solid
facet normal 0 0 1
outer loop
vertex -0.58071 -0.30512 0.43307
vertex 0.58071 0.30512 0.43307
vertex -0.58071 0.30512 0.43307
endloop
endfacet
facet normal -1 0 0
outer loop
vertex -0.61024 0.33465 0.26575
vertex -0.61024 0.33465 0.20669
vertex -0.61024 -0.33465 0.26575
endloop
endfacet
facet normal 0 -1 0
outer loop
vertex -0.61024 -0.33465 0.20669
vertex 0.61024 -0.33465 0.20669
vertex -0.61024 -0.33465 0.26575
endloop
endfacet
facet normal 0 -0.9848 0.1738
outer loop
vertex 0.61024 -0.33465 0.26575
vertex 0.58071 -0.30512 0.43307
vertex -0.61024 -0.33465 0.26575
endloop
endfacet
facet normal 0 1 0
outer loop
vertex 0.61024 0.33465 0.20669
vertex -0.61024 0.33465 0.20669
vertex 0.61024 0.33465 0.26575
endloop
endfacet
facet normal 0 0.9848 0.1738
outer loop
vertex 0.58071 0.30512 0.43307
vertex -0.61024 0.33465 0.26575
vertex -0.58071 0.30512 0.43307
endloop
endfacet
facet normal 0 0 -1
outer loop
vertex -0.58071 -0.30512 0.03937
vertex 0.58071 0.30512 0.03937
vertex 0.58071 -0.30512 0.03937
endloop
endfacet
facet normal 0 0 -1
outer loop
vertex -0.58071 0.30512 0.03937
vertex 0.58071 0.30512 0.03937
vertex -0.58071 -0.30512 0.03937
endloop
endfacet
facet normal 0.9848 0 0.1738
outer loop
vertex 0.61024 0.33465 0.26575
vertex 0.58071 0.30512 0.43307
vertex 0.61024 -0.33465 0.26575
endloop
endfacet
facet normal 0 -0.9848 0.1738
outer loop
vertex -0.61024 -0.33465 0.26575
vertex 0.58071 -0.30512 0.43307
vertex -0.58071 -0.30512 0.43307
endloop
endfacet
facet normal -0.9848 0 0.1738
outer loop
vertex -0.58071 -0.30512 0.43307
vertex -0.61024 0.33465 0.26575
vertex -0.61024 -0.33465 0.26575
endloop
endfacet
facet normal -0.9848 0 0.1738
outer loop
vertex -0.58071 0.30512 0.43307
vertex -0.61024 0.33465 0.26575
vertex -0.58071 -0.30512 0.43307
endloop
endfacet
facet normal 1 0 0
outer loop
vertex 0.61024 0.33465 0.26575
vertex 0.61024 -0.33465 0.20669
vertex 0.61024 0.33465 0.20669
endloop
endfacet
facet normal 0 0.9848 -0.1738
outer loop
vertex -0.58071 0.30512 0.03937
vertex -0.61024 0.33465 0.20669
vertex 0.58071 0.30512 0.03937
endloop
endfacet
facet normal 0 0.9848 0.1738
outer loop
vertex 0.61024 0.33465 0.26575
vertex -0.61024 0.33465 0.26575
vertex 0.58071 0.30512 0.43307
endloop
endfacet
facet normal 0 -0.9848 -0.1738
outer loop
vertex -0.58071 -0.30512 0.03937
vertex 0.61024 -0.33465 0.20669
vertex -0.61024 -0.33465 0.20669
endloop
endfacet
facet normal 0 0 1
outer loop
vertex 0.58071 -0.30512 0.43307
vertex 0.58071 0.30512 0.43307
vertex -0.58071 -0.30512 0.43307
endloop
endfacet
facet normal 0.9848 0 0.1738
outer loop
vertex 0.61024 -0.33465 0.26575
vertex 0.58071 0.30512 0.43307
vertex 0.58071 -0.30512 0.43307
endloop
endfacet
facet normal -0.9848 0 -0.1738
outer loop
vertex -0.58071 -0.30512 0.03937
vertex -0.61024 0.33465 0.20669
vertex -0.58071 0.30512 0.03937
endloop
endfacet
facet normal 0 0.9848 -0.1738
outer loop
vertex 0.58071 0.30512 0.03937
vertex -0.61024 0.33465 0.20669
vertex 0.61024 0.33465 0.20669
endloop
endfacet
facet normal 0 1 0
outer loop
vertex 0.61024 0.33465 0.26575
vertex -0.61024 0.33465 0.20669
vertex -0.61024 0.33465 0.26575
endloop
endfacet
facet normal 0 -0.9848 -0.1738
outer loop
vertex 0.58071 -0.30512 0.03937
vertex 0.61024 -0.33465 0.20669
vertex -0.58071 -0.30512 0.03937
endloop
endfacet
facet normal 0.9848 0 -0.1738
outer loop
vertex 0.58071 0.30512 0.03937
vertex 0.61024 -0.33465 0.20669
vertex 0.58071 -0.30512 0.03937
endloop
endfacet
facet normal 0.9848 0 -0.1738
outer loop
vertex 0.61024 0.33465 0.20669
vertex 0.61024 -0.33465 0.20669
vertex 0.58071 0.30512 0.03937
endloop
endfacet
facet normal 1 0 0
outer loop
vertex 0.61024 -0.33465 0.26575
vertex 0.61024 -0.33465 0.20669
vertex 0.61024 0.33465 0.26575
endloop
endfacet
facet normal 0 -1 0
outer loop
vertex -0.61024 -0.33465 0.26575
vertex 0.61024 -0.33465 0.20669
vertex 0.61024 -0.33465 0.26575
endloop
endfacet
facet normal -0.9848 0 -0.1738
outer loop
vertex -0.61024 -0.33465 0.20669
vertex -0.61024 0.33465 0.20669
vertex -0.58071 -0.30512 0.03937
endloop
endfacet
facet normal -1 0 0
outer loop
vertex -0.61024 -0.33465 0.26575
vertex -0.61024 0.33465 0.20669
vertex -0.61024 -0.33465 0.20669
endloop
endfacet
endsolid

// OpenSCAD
// file: defines.scad
e = 0.95;    // Шаг выводов
e1 = 1.90;

/*A  = 1.00;  // 0.89..1.45*/
A2 = 1.00; // 0.90..1.30
A1 = 0.10; // 0.00..0.15
A = A1 + A2;
E  = 2.50; // 2.10..3.00
E1 = 1.70; // 1.20..1.80
D  = 3.10; // 2.70..3.10
L  = 0.30; // 0.15..0.60
fi = 20.0; // 0.00..30.00
c  = 0.15; // 0.09..0.26
b  = 0.40; // 0.30..0.51



scale = 1/2.54;
// main file
include <defines.scad>

an = 0.15;

/*module Label() {
  translate([0, 0, A-lab_h]) {
    linear_extrude(height = lab_h*2, center=false)
    scale(0.06)
    text("HUC7", font = font, valign="center", halign="center");
  }
}*/

module Body() {
  translate([0, 0, A1]) {
    hull(){
      translate([0, 0, A2/2]) cube([D, E1, c], center=true);
      translate([0, 0, A2/2]) cube([D-an, E1-an, A2], center=true);
    }
  }
}

scale(scale)
color([0.25,0.25,0.25]) {
  Body();
}
